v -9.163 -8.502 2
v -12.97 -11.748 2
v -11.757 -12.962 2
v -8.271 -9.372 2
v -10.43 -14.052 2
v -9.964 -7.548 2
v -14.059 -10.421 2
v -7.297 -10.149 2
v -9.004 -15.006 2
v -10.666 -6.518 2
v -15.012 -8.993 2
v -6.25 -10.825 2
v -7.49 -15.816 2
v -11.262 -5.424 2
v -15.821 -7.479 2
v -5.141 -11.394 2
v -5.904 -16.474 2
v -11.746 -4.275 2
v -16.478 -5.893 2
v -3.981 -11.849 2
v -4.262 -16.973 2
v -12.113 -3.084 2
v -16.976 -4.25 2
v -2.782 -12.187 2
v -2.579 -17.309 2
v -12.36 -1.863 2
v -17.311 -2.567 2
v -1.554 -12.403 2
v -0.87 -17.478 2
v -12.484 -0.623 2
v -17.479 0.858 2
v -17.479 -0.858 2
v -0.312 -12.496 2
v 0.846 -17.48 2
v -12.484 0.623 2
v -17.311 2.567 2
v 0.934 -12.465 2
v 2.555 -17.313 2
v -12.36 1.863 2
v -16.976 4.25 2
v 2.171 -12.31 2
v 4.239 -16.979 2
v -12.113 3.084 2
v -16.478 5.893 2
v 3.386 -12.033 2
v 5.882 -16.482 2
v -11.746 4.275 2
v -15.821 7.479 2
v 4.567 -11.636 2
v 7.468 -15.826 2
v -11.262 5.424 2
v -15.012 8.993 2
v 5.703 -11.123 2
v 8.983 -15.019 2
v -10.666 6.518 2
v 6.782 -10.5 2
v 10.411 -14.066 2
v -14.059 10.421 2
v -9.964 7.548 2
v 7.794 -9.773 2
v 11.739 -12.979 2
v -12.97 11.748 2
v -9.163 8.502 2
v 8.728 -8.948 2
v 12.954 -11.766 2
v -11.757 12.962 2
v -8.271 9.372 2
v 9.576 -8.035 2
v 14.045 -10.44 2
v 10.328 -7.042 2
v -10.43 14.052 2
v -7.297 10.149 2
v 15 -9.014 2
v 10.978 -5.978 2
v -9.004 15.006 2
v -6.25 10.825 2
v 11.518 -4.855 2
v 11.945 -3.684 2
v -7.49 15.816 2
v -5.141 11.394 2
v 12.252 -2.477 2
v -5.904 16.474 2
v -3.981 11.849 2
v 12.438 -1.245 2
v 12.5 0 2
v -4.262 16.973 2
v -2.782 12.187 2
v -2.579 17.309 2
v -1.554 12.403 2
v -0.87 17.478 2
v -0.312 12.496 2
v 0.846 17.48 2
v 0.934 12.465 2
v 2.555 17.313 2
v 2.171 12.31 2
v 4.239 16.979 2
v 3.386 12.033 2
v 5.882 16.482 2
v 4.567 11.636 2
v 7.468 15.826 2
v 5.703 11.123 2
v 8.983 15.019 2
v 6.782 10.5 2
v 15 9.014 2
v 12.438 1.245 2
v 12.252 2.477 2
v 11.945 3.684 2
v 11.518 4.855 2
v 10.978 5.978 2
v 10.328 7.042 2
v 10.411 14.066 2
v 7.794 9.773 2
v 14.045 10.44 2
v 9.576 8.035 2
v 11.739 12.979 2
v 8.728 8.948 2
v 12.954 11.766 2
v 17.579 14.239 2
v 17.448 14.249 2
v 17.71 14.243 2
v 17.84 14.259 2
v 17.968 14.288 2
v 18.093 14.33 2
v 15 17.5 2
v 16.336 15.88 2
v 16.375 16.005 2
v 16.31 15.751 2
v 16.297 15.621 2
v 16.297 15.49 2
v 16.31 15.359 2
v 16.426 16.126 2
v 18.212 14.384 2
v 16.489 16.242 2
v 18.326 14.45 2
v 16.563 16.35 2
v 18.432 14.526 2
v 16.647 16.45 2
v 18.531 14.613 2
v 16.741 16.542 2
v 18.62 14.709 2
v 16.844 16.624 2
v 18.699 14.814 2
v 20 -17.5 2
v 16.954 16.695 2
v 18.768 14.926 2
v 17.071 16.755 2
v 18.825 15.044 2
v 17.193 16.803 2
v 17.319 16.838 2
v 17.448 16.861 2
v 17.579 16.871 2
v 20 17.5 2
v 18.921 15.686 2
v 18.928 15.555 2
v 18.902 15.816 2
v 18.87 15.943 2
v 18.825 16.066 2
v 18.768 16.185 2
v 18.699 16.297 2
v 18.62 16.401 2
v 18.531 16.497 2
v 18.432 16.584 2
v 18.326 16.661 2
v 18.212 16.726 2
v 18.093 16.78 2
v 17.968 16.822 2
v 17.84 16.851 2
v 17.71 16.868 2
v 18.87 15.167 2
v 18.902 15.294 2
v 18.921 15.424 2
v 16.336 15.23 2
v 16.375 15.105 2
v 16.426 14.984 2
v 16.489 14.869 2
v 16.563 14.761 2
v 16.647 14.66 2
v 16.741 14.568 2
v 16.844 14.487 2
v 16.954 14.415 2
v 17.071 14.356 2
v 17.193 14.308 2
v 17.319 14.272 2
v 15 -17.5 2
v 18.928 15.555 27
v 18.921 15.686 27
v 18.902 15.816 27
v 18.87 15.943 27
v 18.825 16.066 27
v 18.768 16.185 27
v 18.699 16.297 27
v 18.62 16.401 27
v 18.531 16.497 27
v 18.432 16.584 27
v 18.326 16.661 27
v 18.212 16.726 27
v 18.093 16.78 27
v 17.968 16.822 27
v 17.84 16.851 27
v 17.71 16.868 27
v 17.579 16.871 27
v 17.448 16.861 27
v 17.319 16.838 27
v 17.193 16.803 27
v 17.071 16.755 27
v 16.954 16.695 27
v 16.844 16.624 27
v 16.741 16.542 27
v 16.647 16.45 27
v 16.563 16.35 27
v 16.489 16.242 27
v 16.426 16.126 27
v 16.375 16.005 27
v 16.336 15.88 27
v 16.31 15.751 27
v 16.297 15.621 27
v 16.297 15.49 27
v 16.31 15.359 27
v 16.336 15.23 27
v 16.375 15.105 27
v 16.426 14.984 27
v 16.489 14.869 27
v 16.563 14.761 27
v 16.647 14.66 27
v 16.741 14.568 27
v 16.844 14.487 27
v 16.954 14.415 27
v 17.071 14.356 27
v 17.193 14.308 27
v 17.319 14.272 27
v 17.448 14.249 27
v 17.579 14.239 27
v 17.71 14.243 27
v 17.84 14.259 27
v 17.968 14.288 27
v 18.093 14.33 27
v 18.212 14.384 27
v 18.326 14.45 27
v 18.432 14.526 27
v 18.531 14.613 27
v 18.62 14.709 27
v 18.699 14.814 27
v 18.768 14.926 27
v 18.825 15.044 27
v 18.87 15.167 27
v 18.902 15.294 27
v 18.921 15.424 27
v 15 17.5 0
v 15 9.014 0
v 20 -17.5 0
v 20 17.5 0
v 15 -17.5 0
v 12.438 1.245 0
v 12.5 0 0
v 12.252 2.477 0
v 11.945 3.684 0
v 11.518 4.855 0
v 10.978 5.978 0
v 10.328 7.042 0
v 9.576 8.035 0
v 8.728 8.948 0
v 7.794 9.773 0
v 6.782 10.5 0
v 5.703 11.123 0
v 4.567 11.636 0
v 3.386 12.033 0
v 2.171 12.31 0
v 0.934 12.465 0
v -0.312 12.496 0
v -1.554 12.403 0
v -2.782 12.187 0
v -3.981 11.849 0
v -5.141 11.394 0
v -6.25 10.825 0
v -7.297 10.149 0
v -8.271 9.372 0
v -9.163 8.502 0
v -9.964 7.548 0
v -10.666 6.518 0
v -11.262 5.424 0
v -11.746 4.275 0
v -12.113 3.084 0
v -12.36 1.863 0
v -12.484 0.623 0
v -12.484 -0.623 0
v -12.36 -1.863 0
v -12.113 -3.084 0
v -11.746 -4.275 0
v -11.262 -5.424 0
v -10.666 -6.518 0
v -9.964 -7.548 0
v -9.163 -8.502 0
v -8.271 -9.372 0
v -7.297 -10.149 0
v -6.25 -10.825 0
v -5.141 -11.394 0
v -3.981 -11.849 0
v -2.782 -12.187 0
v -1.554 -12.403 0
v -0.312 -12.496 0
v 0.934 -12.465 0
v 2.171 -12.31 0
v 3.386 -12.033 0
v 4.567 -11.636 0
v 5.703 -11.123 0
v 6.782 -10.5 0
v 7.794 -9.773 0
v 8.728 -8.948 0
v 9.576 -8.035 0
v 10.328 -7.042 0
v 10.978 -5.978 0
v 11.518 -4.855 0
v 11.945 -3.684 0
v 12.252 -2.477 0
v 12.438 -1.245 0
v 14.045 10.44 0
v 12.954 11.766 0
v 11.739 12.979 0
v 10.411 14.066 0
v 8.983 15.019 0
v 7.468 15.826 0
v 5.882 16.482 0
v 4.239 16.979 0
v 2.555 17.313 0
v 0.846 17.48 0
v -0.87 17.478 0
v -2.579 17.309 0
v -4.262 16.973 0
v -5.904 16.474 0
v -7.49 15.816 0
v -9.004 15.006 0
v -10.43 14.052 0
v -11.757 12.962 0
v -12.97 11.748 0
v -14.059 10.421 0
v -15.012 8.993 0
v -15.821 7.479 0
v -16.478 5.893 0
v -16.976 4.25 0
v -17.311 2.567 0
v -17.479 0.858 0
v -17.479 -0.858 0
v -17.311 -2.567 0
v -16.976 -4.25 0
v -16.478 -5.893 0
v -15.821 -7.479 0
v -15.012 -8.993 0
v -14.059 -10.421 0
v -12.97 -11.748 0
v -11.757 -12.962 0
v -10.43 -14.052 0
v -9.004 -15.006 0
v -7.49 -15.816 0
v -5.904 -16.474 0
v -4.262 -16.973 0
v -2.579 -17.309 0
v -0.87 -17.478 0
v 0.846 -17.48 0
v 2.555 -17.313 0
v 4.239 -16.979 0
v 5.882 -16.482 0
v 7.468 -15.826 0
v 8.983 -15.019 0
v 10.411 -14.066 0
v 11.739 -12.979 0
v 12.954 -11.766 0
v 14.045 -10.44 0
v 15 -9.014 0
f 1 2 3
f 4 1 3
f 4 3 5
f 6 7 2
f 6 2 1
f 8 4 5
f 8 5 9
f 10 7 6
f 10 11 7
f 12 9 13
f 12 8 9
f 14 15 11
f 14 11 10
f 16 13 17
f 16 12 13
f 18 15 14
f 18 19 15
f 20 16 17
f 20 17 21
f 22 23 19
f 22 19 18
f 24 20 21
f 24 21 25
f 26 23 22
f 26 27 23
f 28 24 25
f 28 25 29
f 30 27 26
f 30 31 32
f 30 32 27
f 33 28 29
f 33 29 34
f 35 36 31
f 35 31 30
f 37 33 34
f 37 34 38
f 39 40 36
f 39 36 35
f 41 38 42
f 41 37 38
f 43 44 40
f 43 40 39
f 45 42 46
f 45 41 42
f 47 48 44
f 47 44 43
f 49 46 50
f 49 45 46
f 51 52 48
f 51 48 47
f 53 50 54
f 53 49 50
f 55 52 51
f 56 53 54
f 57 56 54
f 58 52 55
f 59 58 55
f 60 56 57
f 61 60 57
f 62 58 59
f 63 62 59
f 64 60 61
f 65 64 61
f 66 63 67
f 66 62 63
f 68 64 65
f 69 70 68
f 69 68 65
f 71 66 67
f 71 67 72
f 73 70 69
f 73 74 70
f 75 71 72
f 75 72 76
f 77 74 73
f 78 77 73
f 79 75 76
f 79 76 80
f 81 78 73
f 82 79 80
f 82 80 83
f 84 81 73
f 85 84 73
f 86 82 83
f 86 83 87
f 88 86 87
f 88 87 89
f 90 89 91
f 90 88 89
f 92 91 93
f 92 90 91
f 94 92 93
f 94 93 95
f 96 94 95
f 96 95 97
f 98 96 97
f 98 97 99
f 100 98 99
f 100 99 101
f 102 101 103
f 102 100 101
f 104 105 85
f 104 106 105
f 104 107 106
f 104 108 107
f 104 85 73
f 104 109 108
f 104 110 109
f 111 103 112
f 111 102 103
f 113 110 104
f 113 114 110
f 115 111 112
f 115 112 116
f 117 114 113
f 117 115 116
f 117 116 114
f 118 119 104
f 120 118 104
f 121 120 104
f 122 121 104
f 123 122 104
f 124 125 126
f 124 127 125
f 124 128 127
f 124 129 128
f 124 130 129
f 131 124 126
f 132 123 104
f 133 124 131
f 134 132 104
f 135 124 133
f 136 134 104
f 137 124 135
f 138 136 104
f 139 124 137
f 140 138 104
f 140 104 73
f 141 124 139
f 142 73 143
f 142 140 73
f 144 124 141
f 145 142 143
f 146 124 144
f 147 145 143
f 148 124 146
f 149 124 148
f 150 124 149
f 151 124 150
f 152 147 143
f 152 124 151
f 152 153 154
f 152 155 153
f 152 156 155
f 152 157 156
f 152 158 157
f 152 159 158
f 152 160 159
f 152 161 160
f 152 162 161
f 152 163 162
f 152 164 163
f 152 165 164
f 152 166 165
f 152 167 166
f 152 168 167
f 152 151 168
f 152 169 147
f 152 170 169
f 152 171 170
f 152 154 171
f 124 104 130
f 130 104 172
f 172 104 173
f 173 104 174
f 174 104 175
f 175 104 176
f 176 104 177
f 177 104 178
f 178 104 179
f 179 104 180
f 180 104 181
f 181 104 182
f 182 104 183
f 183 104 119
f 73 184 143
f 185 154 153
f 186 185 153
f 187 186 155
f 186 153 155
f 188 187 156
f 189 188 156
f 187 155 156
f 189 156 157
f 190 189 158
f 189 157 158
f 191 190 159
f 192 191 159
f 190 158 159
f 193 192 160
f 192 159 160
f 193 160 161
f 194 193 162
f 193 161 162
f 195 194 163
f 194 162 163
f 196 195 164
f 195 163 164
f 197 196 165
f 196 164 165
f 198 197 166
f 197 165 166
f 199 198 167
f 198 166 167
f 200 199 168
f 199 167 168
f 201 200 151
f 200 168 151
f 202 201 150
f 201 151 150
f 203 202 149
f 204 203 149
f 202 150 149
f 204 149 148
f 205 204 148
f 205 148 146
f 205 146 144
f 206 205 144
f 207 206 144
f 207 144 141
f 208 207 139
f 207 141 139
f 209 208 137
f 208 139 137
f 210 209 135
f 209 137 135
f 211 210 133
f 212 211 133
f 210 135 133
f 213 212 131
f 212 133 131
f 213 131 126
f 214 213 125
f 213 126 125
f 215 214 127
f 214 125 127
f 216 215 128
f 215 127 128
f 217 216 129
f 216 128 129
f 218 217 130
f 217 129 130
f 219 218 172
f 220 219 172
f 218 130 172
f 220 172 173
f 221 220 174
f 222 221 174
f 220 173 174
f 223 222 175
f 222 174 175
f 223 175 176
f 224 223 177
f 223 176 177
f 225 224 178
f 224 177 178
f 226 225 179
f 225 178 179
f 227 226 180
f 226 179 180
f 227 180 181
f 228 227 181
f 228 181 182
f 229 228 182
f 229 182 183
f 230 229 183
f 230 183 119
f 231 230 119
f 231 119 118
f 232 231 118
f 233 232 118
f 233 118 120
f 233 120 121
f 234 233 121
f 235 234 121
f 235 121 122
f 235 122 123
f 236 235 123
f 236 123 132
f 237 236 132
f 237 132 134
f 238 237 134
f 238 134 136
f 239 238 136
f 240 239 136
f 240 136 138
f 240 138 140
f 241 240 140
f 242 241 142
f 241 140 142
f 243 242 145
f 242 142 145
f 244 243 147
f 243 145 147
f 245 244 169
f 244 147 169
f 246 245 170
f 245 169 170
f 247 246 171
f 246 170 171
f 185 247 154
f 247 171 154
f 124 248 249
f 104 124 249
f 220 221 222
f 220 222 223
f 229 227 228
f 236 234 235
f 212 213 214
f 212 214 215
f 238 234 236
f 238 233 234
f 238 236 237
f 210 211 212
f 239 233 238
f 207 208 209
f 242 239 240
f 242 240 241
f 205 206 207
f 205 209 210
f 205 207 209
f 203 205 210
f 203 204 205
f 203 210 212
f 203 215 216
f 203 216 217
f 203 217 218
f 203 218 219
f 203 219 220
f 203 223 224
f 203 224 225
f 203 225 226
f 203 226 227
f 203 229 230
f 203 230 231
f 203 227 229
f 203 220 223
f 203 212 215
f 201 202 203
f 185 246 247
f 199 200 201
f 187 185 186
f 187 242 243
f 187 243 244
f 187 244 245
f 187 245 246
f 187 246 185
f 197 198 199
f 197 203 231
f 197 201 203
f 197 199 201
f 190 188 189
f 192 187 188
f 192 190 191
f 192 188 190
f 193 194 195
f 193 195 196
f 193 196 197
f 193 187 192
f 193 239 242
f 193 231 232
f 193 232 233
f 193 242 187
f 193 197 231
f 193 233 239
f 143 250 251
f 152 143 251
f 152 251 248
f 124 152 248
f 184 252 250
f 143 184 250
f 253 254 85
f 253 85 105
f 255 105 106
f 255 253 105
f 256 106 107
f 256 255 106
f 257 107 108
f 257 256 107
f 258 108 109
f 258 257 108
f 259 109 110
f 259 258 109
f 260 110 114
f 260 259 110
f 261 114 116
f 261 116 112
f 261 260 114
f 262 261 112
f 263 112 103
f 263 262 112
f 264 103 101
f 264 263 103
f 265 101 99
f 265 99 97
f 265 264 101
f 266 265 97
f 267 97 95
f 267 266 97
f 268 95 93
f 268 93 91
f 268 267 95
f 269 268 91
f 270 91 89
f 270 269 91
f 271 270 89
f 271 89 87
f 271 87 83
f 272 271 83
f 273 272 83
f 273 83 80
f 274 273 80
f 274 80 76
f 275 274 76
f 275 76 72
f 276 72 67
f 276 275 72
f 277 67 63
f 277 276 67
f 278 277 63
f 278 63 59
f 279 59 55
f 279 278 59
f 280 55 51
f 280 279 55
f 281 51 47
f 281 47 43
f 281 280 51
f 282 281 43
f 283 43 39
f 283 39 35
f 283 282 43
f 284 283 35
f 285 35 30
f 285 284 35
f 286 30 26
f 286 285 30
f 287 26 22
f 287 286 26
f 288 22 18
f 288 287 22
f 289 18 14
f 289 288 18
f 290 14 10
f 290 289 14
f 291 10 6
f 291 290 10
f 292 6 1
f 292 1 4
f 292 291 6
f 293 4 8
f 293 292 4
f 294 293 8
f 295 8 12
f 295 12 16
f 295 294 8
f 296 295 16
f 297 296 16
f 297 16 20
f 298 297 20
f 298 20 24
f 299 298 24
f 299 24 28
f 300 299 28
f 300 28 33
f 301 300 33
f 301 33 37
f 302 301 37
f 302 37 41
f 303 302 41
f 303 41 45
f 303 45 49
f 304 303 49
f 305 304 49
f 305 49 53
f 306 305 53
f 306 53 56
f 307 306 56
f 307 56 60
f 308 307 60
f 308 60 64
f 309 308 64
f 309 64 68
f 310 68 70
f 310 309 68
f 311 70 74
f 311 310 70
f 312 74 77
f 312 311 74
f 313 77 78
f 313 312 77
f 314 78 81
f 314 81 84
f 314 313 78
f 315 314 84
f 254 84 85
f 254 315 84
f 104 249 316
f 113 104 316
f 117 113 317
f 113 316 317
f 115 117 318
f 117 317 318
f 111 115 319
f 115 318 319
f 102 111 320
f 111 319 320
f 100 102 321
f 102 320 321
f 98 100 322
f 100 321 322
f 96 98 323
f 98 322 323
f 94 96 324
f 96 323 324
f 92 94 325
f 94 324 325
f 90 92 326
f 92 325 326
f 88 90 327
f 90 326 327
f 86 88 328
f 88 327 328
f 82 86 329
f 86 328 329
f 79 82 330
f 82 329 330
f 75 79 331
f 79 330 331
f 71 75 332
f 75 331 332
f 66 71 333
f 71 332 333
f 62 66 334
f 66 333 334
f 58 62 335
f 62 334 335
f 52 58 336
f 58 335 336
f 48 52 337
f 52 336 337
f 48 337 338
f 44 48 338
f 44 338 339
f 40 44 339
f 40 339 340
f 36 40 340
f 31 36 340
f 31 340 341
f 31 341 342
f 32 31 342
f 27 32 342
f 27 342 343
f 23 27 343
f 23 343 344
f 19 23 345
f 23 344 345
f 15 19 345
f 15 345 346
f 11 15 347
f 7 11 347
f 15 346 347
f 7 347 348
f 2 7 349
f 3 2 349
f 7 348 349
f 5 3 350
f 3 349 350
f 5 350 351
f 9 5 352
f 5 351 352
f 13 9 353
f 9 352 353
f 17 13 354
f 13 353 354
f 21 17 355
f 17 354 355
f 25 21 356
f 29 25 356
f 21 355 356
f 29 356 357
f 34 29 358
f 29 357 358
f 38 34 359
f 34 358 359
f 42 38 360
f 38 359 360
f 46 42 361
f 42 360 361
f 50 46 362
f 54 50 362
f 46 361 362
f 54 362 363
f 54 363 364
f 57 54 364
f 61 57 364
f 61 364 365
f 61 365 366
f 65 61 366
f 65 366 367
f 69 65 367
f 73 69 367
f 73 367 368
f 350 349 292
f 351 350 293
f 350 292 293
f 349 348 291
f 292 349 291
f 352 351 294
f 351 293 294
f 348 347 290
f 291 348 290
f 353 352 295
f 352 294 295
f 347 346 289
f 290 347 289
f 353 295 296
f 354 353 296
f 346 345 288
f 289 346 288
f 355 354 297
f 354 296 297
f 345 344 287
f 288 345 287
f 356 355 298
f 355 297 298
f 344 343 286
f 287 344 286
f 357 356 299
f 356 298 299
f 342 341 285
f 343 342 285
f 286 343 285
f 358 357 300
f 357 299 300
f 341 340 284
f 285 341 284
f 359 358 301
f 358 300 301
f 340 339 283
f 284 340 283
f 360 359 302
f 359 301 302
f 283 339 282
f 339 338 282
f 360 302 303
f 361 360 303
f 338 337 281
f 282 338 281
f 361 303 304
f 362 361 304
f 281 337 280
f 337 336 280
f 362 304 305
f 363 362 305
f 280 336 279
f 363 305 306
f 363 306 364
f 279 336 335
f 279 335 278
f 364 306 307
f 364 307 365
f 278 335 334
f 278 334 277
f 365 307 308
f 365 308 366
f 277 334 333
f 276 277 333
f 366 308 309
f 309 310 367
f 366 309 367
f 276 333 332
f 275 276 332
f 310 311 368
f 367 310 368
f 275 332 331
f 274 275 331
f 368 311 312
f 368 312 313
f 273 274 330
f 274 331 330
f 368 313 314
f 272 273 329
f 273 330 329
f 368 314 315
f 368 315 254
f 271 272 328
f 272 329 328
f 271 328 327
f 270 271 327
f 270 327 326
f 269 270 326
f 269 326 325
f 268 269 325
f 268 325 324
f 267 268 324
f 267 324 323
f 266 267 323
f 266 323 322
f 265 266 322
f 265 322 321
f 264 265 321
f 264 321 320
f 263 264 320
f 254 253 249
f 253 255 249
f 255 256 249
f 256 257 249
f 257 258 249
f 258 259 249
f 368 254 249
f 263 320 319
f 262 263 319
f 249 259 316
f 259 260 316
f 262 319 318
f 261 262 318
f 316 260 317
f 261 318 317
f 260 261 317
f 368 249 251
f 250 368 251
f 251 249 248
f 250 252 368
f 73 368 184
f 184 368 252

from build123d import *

# Parameters (mm, degrees)
F0_R     = 12.5
F1_DEPTH = 2
F2_R     = 1.3161451829
F3_DEPTH = 25


with BuildPart() as f1:
    # F0 (on Top) → F1 (new body)
    with BuildSketch(Plane.XY):
        with BuildLine():
            ThreePointArc((15, -9.0138781887), (16.863421954, -4.6770717335), (17.5, 0))
            ThreePointArc((17.5, 0), (16.863421954, 4.6770717335), (15, 9.0138781887))
            Line((15, 9.0138781887), (15, -9.0138781887))
        make_face()
        with BuildLine():
            ThreePointArc((15, 9.0138781887), (16.863421954, 4.6770717335), (17.5, 0))
            ThreePointArc((17.5, 0), (16.863421954, -4.6770717335), (15, -9.0138781887))
            Line((15, -9.0138781887), (15, -17.5))
            Line((15, -17.5), (20, -17.5))
            Line((20, -17.5), (20, 17.5))
            Line((20, 17.5), (15, 17.5))
            Line((15, 17.5), (15, 9.0138781887))
        make_face()
        with BuildLine():
            Line((15, -9.0138781887), (15, 9.0138781887))
            ThreePointArc((15, 9.0138781887), (-17.5, 0), (15, -9.0138781887))
        make_face()
        Circle(F0_R, mode=Mode.SUBTRACT)
    extrude(amount=F1_DEPTH)

    # F2 (on face) → F3 (join)
    with BuildSketch(Plane.XY.offset(2)):
        with Locations((17.6118854433, 15.5552299693)):
            Circle(F2_R)
    extrude(amount=F3_DEPTH)


solid = f1.part
